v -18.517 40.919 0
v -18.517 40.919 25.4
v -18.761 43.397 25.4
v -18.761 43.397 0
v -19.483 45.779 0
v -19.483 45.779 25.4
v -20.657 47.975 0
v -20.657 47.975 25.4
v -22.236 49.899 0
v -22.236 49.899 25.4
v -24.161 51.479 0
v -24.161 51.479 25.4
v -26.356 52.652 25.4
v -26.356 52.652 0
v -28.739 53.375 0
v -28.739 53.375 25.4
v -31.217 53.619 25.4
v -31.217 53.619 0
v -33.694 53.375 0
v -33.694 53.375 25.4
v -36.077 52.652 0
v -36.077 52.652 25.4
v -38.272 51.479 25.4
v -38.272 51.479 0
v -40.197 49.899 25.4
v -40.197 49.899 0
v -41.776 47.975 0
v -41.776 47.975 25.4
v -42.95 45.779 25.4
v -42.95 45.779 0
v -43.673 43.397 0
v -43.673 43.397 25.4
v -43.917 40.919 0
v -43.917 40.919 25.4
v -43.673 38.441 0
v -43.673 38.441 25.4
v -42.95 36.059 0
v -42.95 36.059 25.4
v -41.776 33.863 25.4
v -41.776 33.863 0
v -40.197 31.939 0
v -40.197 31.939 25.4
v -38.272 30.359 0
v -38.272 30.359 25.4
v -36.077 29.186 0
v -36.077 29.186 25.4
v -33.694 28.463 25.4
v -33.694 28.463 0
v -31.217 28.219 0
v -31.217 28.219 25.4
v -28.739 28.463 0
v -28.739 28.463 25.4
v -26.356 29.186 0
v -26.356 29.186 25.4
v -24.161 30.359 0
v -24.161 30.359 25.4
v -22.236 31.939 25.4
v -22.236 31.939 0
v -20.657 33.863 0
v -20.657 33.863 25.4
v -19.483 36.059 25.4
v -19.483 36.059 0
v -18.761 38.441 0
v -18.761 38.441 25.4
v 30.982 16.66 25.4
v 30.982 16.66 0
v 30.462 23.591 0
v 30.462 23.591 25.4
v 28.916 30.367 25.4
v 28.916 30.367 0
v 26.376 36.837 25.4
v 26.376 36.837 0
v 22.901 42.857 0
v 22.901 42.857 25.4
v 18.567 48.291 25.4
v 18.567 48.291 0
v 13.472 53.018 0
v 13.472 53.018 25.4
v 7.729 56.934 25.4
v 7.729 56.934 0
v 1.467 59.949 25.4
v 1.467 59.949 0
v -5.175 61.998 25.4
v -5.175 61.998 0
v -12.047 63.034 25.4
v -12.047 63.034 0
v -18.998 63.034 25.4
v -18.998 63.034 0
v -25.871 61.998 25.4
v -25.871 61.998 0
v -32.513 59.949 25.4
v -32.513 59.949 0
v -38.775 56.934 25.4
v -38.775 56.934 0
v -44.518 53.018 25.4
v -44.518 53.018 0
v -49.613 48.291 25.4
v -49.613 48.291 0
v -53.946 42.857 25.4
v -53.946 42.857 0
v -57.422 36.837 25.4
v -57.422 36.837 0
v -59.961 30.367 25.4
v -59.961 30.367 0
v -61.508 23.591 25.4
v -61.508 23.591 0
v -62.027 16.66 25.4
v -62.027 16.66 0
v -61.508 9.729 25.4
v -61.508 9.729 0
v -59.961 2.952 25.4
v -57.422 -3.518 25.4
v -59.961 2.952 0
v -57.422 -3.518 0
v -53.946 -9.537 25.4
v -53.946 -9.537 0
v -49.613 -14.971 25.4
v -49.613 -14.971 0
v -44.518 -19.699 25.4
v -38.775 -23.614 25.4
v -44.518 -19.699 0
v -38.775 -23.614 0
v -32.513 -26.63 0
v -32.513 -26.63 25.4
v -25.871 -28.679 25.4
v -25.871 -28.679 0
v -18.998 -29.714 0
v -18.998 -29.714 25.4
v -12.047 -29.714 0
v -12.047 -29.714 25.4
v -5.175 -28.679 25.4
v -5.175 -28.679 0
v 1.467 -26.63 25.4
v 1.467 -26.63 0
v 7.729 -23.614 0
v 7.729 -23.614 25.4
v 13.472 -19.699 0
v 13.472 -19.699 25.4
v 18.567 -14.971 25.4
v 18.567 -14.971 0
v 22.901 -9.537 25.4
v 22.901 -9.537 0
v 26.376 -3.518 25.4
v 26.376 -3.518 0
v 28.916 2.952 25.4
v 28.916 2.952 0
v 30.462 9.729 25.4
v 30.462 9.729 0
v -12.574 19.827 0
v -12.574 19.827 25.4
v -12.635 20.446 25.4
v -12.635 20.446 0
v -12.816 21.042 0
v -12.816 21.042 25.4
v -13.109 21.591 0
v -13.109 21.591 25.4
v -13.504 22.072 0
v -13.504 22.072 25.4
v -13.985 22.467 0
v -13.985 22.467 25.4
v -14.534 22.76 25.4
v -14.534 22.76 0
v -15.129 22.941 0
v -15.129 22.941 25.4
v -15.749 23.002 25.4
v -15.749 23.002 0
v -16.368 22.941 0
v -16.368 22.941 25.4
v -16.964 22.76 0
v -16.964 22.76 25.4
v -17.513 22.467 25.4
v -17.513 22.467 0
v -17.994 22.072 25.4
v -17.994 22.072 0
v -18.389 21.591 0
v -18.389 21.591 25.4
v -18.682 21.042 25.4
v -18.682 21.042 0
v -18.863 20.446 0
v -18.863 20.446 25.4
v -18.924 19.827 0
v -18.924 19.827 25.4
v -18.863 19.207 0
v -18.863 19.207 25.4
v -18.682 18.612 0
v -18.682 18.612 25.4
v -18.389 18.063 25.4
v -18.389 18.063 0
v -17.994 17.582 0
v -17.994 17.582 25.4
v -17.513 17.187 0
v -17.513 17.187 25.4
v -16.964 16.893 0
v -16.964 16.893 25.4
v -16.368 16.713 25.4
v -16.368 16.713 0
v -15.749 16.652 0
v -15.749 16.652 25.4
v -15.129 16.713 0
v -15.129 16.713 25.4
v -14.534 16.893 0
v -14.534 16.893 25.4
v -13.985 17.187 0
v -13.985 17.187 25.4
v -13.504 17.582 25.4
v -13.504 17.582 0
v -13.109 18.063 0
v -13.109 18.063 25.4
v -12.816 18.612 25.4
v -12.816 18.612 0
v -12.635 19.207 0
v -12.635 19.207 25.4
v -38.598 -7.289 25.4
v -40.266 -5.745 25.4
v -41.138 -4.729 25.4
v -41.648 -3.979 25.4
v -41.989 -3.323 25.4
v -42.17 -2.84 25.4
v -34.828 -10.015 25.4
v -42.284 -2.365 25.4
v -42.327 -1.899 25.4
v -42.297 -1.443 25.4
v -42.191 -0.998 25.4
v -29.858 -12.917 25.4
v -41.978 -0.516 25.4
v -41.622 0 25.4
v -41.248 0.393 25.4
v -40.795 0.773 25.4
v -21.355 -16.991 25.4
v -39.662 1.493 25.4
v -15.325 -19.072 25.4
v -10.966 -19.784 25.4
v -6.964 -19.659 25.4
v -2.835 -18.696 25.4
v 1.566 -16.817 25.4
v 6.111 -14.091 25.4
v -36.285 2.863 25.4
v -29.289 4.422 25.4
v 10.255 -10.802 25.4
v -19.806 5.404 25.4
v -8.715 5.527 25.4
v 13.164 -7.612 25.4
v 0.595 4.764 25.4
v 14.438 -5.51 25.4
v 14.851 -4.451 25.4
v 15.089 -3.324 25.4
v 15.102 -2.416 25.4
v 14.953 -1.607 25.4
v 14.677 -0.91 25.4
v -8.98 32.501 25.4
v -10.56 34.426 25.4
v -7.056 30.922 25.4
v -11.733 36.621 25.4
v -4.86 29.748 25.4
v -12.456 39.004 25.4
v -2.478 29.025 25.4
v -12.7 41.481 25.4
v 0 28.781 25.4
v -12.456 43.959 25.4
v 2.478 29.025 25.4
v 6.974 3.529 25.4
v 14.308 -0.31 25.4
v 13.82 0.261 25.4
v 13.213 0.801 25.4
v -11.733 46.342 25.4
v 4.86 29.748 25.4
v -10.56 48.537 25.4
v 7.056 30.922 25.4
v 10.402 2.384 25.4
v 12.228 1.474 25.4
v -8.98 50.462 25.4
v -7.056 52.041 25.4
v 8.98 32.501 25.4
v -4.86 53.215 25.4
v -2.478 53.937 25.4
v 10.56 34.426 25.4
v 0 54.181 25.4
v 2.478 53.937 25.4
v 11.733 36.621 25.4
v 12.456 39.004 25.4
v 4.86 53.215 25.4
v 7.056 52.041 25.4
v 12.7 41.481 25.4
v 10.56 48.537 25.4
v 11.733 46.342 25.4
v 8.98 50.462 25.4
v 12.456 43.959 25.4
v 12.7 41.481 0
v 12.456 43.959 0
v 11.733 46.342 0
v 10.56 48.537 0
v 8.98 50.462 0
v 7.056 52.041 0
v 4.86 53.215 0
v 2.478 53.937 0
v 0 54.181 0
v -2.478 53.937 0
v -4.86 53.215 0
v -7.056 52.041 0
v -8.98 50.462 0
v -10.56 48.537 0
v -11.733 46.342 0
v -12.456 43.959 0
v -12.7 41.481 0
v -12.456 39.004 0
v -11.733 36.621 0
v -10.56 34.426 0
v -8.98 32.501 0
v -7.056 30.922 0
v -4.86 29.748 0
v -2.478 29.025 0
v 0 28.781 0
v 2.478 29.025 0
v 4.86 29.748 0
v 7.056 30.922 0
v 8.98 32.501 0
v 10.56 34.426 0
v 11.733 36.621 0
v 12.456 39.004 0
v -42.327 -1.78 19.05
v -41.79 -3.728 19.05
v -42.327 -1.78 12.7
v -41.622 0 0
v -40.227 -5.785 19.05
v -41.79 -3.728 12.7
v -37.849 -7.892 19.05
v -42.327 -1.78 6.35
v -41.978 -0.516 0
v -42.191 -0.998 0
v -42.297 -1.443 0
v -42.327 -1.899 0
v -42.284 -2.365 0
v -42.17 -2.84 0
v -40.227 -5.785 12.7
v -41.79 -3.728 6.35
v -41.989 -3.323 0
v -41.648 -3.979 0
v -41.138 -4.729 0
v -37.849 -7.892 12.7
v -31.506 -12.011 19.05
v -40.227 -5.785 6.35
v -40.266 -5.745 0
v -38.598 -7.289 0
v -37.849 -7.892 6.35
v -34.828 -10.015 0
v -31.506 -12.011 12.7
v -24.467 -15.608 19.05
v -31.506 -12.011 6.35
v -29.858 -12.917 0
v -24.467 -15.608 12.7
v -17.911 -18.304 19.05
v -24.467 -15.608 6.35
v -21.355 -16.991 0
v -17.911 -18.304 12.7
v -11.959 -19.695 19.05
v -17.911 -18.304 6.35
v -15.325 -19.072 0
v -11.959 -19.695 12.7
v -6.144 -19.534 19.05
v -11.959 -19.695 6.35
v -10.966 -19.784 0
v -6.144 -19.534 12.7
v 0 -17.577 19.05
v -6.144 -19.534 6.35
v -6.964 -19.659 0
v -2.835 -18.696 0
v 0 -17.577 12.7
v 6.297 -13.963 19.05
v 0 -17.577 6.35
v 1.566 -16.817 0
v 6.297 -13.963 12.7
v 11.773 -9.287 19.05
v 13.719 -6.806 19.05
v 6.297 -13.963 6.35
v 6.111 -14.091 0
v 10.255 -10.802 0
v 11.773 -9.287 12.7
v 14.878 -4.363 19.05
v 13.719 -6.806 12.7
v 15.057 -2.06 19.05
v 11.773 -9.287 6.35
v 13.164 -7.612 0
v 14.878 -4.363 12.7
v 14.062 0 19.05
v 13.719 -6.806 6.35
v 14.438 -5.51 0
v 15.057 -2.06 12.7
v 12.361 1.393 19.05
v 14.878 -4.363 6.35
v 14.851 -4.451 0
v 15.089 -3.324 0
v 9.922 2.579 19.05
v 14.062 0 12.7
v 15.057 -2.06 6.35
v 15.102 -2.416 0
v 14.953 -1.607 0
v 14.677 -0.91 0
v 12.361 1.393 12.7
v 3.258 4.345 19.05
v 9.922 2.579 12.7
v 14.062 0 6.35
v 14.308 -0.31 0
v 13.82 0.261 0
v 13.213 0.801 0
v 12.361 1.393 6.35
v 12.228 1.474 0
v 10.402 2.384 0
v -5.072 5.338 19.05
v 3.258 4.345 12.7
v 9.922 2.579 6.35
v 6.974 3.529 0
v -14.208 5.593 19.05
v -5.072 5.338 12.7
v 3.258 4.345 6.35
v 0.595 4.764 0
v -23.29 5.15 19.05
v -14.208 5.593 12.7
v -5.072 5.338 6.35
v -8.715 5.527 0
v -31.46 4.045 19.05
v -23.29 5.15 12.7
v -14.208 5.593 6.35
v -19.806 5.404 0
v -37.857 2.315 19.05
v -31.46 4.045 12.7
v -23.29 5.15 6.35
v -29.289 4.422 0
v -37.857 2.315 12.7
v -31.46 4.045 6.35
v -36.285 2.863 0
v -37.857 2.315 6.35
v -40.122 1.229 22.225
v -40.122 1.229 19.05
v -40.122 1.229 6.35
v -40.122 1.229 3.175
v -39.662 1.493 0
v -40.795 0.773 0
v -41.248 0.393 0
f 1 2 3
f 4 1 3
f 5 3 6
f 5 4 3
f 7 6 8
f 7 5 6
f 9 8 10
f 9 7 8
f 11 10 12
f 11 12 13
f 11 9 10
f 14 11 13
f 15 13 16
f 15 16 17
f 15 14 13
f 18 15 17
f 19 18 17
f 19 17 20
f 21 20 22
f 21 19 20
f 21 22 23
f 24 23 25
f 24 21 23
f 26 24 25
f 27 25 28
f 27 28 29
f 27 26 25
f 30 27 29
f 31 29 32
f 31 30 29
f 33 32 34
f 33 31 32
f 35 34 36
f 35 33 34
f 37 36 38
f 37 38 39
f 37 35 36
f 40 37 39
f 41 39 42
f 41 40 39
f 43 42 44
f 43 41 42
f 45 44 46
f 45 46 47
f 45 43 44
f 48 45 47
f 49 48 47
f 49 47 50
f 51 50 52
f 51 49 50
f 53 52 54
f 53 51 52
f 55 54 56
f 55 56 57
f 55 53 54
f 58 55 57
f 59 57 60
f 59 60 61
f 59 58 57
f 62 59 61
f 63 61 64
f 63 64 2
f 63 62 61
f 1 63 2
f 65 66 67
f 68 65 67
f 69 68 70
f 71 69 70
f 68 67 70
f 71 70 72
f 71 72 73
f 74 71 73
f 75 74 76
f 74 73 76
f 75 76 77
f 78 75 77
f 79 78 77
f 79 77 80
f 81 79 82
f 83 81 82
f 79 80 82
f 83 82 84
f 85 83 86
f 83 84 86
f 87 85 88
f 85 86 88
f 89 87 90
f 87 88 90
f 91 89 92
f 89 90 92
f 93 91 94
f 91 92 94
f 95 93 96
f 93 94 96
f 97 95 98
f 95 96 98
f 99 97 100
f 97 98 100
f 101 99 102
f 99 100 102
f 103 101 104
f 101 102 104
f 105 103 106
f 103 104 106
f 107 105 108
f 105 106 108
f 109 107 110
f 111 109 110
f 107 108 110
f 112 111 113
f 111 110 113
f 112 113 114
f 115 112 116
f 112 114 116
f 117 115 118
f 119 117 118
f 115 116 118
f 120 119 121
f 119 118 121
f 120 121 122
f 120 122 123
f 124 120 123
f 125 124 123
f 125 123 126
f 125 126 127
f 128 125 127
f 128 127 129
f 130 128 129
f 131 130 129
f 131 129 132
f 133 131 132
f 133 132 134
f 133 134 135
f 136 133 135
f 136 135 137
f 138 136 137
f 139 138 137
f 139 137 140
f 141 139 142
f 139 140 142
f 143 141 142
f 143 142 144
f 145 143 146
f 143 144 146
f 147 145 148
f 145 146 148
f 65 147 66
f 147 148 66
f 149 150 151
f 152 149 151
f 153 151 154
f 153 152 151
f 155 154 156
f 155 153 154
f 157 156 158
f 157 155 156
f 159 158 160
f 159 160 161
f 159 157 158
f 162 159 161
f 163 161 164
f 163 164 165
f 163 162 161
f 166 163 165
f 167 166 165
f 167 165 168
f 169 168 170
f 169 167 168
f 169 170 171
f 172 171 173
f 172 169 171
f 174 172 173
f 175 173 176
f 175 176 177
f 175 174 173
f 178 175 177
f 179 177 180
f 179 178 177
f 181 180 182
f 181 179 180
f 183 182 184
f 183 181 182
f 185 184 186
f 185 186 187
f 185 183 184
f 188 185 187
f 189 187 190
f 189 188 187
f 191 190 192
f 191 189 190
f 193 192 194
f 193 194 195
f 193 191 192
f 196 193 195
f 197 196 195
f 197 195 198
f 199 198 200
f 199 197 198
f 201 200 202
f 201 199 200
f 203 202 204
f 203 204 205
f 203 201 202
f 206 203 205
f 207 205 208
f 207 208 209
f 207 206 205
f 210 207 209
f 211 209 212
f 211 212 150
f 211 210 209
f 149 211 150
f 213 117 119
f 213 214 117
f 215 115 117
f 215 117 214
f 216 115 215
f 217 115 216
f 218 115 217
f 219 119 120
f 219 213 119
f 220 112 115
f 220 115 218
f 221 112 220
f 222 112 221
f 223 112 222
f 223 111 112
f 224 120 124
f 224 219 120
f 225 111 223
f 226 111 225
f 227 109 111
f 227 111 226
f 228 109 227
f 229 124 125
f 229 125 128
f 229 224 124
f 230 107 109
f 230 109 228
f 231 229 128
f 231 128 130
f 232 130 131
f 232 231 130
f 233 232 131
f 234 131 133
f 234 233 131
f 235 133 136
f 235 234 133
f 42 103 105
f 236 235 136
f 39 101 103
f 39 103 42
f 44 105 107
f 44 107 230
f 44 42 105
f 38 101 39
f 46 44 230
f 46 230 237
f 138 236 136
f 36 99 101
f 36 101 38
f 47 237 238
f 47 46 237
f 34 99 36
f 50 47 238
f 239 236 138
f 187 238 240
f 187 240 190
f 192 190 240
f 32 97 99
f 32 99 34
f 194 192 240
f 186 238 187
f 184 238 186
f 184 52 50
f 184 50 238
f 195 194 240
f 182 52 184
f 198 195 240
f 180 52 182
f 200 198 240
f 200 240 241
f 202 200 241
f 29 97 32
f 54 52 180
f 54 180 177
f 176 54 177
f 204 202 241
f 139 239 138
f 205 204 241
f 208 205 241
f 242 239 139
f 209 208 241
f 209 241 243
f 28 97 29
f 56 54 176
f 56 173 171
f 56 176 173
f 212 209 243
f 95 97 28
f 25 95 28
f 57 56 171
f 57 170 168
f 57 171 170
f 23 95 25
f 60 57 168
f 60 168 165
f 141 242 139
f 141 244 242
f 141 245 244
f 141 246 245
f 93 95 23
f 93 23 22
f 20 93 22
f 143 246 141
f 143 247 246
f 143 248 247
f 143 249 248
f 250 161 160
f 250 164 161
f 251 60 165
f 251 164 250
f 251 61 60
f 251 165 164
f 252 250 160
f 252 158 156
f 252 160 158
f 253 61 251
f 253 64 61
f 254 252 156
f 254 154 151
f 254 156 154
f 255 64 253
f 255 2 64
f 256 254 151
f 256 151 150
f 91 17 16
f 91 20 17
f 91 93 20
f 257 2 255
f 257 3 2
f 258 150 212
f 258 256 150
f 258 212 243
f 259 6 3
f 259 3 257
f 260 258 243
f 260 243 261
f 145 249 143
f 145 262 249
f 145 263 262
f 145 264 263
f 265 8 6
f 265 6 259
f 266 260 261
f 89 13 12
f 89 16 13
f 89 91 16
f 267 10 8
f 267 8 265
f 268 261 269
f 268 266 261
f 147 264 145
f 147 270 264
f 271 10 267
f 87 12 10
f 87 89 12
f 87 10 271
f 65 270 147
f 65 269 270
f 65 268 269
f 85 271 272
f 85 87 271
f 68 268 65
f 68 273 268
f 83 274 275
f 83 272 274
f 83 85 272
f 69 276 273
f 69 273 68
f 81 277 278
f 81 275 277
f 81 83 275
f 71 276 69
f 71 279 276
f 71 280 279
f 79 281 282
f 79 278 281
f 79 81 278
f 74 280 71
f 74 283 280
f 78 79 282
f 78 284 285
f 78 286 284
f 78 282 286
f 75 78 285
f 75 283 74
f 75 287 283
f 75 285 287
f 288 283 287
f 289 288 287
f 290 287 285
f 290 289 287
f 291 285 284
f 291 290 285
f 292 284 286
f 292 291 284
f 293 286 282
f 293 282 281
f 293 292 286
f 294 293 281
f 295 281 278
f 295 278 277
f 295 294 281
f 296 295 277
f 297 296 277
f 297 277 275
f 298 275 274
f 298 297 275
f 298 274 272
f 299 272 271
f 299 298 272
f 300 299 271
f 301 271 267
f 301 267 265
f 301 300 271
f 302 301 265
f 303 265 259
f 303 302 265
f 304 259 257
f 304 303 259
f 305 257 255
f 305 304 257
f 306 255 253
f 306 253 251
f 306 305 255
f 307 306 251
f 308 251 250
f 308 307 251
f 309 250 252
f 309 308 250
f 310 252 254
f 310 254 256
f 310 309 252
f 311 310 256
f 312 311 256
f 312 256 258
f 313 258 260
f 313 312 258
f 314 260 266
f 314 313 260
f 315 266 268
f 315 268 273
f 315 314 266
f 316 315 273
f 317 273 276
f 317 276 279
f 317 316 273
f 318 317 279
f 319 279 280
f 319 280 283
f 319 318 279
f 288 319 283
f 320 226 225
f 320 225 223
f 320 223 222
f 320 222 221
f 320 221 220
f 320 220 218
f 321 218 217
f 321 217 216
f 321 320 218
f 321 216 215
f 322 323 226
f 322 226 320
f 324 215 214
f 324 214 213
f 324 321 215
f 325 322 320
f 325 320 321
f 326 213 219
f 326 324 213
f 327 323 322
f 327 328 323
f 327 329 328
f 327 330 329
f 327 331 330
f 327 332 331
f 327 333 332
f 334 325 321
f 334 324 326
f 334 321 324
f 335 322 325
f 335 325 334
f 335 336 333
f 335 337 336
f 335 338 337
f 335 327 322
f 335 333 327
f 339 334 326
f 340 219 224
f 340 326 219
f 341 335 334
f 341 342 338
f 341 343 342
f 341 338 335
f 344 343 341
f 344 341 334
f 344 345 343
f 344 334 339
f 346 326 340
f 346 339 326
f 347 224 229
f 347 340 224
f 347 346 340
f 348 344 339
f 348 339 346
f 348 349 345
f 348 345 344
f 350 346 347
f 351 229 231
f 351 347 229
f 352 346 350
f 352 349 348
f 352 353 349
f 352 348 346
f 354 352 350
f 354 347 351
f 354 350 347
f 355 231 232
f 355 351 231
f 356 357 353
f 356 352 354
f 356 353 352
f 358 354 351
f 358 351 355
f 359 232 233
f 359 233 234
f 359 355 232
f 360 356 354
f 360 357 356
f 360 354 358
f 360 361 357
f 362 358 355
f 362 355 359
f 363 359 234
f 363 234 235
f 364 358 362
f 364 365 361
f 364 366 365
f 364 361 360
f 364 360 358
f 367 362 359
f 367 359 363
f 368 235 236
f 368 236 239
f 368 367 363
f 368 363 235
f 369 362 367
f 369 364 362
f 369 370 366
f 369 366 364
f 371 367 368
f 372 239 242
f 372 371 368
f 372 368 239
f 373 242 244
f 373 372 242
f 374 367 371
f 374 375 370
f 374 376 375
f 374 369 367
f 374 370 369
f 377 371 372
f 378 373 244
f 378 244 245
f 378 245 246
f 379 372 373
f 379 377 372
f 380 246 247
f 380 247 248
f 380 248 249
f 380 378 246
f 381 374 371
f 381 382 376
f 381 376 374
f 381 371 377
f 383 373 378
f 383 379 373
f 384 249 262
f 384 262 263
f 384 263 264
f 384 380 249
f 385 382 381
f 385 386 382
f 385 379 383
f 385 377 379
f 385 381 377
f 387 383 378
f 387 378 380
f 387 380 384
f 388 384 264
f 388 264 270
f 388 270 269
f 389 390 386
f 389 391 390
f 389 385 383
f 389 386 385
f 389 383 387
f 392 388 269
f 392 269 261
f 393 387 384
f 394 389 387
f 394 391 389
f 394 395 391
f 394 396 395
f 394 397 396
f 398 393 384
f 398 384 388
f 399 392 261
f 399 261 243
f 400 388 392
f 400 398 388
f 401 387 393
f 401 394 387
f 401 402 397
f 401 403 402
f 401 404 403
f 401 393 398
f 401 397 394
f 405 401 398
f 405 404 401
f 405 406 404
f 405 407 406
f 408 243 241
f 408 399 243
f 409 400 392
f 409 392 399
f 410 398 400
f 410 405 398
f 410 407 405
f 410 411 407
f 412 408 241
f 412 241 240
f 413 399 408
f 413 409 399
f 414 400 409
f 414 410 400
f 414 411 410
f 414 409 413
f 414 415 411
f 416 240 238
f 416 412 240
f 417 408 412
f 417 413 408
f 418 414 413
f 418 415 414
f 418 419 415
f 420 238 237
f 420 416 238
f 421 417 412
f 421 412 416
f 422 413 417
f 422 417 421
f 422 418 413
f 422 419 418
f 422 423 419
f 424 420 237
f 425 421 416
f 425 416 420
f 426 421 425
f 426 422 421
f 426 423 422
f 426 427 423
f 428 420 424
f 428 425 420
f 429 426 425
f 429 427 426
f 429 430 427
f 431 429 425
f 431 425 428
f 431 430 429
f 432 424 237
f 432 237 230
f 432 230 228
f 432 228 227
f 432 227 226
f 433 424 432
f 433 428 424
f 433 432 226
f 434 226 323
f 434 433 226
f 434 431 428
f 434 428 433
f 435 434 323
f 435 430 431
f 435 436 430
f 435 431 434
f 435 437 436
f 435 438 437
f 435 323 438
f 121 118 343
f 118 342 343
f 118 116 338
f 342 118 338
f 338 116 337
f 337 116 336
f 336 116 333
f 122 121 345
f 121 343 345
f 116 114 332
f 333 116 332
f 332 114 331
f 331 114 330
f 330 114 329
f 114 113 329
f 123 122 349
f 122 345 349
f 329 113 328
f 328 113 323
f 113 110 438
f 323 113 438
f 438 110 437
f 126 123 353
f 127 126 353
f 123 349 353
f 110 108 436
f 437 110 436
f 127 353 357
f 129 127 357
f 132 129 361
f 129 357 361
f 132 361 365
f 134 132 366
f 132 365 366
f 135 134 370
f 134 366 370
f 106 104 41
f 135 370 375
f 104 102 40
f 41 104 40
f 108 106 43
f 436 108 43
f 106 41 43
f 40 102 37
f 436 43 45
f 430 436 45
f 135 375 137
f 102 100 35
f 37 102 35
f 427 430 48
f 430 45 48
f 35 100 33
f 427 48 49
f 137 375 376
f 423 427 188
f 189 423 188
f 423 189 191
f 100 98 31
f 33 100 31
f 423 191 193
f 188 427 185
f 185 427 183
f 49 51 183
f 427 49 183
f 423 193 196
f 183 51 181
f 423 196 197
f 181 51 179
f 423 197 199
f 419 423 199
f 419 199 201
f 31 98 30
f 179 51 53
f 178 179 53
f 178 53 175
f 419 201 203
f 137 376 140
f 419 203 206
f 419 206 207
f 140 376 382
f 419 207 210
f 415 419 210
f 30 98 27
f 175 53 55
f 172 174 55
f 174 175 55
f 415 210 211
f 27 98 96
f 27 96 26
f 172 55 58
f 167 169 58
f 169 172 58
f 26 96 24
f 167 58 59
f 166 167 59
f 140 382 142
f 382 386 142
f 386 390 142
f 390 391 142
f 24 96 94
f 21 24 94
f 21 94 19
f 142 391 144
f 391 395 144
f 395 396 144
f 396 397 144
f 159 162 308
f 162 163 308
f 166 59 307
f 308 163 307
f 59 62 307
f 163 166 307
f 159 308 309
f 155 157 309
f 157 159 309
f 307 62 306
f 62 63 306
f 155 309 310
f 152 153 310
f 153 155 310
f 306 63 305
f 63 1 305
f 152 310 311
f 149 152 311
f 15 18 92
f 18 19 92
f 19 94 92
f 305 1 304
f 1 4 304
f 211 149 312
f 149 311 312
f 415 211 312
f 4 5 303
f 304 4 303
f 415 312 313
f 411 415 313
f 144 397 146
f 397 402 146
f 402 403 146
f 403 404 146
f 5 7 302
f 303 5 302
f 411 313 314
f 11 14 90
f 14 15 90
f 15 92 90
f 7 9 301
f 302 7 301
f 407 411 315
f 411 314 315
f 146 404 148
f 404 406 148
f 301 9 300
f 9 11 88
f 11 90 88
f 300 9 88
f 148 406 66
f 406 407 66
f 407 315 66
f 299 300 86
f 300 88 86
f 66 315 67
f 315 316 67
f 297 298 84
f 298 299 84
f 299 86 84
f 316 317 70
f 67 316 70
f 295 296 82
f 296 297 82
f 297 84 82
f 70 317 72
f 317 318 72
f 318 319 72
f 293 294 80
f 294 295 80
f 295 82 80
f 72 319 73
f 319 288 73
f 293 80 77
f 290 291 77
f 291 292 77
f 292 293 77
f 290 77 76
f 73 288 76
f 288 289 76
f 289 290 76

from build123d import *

# Parameters (mm, degrees)
F0_R     = 46.5042887468
F0_R_2   = 3.175
F0_R_3   = 12.7
F1_DEPTH = 25.4


with BuildPart() as f1:
    # F0 (on Top) → F1 (new body)
    with BuildSketch(Plane.XY):
        with Locations((-15.5226838734, 16.65979925)):
            Circle(F0_R)
        with BuildLine():
            add(Edge.make_bspline(
                [(-41.6220724583, 0), (-45.3447994291, -4.4678741851), (-21.430444068, -18.4782515244), (-2.3978764958, -22.9578726), (34.4968506502, 8.6723313891), (-35.8537888859, 6.9228727939), (-41.6220724583, 0)],
                knots=[0, 0, 0, 0, 0.2191353875, 0.4445725923, 0.6604545361, 1, 1, 1, 1], degree=3))
        make_face(mode=Mode.SUBTRACT)
        with Locations((-15.7488919795, 19.8267307132)):
            Circle(F0_R_2, mode=Mode.SUBTRACT)
        with Locations((-31.2165562063, 40.9189984202)):
            Circle(F0_R_3, mode=Mode.SUBTRACT)
        with Locations((0, 41.4814576507)):
            Circle(F0_R_3, mode=Mode.SUBTRACT)
    extrude(amount=F1_DEPTH)


solid = f1.part
